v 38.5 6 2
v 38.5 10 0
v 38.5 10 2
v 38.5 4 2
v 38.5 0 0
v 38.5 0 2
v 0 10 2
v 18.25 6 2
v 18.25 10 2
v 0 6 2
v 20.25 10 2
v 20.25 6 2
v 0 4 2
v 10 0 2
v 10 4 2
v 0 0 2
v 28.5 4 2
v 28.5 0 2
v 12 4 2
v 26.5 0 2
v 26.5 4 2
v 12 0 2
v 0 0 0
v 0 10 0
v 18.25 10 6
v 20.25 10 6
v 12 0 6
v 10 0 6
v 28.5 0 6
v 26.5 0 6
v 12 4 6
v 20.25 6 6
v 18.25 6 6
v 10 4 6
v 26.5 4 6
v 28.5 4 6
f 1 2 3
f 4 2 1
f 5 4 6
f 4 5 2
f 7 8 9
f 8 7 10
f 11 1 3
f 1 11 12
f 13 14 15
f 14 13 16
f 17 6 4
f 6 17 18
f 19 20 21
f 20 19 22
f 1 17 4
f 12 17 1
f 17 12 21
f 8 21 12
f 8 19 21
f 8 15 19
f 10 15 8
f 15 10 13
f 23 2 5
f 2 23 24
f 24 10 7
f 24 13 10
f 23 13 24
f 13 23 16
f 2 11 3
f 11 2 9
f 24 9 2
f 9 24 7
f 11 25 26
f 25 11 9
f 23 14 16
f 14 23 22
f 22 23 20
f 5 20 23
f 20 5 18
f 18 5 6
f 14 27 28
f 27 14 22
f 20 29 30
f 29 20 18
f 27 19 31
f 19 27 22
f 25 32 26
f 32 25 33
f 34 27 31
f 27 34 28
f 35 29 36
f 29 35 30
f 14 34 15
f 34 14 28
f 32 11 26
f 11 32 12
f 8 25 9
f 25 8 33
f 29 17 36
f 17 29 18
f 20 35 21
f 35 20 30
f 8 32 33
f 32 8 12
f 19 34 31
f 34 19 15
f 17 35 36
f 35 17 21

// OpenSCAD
// How wide should the slot be that is cut down the middle? e.g. (How thick is your card, in millimeters?)
slotWidth = 2; // the slot width in millimeters
slotOffset = (10 - slotWidth)/2;


difference() {
	// Draw the base and the three vertical bars
	union() {
		translate([0,0,0]) {
			cube([38.5, 10, 2]);
		}
		translate([10,0,2]) {
			cube([2,5,4]);
		}
		translate([18.25,5,2]) {
			cube([2,5,4]);
		}
		translate([26.5,0,2]) {
			cube([2,5,4]);
		}
	}
	// Cut out a slot down the middle for the card to fit into
	translate([0,slotOffset,2]) {
		cube([38.5,slotWidth,4]);
	}
}
